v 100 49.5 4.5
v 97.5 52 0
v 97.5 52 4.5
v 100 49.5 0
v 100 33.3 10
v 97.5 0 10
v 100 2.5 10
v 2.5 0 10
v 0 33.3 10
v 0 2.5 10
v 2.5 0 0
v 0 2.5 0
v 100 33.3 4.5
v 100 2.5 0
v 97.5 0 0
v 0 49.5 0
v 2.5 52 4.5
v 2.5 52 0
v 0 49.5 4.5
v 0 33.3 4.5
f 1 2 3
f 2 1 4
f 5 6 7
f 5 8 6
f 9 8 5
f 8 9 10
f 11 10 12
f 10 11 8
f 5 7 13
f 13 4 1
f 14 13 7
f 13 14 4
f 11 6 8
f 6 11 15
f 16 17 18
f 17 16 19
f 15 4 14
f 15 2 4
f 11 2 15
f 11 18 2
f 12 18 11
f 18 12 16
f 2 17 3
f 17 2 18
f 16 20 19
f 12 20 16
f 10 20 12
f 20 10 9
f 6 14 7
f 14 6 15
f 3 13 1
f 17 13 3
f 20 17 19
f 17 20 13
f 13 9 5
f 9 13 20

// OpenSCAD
$fn = 32;

// ----------------------------------------------------------------------
// Stepped bar: sidestep, 100 x 52 x 10/4.5 mm
// ----------------------------------------------------------------------

// --- parameters (mm) ---
bar_l = 100;              // bar length, X
bar_w = 52;               // bar width, Y
plate_t = 10;             // thickness of the thick zone, Z
thin_t = 4.5;             // thickness of the thin zone
corner_c = 2.5;           // corner chamfer of the bar
step_cut = 5.5;           // material removed from the thin zone
ledge_y = 33.3;           // start of the ledge from the front edge
depth_1 = 5.5;            // depth of cut 1 from the top face

profile = [[2.5, 0], [97.5, 0], [100, 2.5], [100, 49.5], [97.5, 52], [2.5, 52], [0, 49.5], [0, 2.5]];  // primary outline, 8 points, counter clockwise
void_1 = [[-1, 33.3], [101, 33.3], [101, 53], [-1, 53]];  // ledge cut along one edge, 4 points

// --- the one profile operation ---
difference() {
  linear_extrude(height = plate_t) polygon(points = profile);
  translate([0, 0, plate_t - depth_1])
    linear_extrude(height = depth_1 + 1) polygon(points = void_1);
}
